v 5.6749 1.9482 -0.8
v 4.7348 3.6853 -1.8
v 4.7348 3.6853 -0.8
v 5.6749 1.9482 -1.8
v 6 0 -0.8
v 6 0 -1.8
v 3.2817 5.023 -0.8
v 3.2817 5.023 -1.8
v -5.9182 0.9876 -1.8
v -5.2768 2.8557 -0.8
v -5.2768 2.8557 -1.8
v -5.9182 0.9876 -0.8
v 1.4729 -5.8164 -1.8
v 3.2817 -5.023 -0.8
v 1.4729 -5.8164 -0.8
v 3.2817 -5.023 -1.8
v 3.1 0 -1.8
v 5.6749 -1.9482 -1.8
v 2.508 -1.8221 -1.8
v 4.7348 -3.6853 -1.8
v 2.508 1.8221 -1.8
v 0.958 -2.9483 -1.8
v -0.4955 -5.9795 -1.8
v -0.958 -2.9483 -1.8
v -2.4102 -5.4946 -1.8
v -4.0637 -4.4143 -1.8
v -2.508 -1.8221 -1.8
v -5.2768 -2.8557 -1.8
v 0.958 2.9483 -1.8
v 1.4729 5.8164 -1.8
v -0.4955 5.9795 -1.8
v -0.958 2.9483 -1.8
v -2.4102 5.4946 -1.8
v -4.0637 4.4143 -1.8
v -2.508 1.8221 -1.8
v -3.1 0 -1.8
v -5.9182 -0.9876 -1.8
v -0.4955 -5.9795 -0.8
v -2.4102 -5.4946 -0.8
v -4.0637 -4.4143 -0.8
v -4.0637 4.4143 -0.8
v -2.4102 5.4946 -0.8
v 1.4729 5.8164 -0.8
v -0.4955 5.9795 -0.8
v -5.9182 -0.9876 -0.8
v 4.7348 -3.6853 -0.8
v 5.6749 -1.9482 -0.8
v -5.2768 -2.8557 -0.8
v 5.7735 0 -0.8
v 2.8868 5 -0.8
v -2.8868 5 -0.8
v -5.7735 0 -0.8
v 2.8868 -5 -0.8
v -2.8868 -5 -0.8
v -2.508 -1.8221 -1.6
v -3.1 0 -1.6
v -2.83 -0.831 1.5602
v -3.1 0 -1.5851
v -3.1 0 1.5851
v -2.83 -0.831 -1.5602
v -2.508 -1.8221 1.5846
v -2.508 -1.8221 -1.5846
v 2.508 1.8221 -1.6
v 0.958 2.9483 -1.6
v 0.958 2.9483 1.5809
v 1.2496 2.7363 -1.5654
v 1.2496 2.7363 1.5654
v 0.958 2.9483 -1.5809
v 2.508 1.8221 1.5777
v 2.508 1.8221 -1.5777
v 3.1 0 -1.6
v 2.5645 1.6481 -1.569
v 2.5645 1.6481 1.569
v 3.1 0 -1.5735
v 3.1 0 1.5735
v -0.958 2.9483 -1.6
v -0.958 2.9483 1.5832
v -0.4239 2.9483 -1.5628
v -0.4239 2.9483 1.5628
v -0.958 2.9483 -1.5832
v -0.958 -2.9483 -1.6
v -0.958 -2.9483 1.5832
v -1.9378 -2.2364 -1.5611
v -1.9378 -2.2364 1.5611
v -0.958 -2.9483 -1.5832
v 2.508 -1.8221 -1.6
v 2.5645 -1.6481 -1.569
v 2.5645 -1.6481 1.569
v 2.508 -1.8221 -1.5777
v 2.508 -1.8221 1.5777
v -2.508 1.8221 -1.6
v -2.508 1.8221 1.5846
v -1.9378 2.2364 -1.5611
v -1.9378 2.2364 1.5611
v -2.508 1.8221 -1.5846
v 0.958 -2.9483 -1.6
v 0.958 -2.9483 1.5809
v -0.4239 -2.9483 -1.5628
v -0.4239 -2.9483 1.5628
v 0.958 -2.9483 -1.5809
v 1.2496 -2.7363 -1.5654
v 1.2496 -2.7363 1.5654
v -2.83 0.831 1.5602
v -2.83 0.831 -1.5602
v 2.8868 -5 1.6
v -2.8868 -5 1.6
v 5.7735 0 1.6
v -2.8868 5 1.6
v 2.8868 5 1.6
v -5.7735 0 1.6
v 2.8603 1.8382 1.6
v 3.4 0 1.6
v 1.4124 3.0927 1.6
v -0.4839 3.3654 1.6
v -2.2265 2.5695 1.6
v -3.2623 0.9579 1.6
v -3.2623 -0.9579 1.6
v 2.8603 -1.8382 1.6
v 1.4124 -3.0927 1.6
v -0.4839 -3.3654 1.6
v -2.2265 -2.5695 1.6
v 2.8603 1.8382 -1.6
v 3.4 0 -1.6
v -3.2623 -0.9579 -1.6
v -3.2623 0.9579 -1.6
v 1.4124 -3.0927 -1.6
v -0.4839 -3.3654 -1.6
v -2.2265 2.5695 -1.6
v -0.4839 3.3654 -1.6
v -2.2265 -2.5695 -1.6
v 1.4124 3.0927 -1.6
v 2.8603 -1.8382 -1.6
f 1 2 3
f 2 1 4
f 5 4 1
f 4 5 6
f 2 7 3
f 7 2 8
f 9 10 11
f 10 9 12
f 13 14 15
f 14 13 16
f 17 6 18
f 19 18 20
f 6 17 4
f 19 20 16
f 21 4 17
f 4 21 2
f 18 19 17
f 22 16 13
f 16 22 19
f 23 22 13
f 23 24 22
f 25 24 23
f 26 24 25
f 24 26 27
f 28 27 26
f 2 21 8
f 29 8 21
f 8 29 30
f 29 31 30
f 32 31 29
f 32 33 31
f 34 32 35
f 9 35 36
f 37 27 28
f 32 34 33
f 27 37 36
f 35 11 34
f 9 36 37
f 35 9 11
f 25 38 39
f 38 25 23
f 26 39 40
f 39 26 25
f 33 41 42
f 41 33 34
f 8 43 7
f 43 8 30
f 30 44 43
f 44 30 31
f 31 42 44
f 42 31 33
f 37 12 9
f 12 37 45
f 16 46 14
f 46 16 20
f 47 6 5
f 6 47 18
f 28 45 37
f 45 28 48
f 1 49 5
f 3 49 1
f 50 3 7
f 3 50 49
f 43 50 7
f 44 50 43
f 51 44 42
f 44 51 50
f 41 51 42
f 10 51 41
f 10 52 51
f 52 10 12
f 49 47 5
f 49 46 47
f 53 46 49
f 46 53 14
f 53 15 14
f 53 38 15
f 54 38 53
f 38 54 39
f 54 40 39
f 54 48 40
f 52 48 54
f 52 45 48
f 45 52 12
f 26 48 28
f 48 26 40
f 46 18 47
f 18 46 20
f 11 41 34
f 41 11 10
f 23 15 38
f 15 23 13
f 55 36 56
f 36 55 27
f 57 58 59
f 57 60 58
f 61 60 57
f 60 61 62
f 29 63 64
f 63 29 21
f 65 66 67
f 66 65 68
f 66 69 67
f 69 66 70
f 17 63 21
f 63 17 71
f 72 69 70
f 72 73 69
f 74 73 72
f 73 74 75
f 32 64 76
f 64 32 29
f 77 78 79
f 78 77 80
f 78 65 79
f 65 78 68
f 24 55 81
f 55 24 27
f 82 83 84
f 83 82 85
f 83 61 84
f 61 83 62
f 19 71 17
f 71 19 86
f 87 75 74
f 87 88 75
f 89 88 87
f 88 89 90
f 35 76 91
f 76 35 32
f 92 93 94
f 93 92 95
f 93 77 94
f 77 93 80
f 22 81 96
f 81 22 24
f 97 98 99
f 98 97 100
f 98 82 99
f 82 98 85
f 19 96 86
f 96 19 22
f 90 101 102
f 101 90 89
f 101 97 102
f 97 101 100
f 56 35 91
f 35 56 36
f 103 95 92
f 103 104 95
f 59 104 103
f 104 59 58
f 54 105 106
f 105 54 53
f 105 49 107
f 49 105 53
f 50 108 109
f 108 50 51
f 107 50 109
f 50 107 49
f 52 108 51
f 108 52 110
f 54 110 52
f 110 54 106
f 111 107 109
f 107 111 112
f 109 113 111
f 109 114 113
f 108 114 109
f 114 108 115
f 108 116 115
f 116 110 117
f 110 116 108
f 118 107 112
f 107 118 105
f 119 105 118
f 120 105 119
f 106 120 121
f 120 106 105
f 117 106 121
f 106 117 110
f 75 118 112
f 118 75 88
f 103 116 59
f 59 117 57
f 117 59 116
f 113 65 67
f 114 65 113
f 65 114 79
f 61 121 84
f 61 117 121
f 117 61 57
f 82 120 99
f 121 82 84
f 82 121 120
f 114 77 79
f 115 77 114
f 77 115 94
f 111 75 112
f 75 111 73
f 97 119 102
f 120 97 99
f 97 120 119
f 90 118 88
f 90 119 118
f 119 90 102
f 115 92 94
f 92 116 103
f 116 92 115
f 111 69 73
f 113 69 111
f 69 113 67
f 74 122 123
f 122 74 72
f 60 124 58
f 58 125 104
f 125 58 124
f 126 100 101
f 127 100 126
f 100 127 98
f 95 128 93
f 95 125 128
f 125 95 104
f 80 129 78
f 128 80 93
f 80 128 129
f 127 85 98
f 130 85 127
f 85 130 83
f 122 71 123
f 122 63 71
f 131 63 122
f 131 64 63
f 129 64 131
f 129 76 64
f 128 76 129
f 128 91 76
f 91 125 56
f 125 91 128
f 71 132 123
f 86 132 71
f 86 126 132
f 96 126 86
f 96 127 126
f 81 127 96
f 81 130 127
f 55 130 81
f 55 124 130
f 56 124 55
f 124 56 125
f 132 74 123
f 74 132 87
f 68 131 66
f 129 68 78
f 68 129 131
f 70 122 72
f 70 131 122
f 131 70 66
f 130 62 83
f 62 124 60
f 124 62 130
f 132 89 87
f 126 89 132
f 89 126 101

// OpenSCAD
// Parameters
thread_nominal_diameter_mm = 6; //[3:12:0.1]
thread_pitch_mm = 1; //[0.5:2:0.1]
across_flats_mm = 10; //[6:20:0.1]
thickness_mm = 3.2; //[1.6:6.4:0.1]
tolerance_mm = 0.2; //[0.05:0.5:0.05]
chamfer_mm = 0.3; //[0.1:1:0.05]
overlap_mm = 0.8; //[0.5:2:0.1]
washer_outer_diameter_mm = 12; //[8:24:0.1]
washer_thickness_mm = 1; //[0.5:2.5:0.1]

// Hex Nut Body
module hex_nut_body() {
  color("DimGray") {
    cylinder(h=thickness_mm, r=(across_flats_mm/2)/cos(30), center=true, $fn=6);
  }
}

// Central Thread Hole
module central_thread_hole() {
  cylinder(h=thickness_mm + 2*overlap_mm, r=(thread_nominal_diameter_mm + tolerance_mm)/2, center=true);
}

// Edge Chamfer
module edge_chamfer_top() {
  translate([0, 0, (thickness_mm/2) - (chamfer_mm/2)])
    rotate([180, 0, 0])
    cylinder(h=chamfer_mm, r1=(thread_nominal_diameter_mm + tolerance_mm)/2 + chamfer_mm, r2=0, center=true);
}

module edge_chamfer_bottom() {
  translate([0, 0, (-thickness_mm/2) + (chamfer_mm/2)])
    cylinder(h=chamfer_mm, r1=(thread_nominal_diameter_mm + tolerance_mm)/2 + chamfer_mm, r2=0, center=true);
}

// Washer Outer
module washer_outer() {
  color("Silver") {
    translate([0, 0, (-thickness_mm/2) - (washer_thickness_mm/2) + overlap_mm])
      cylinder(h=washer_thickness_mm, r=washer_outer_diameter_mm/2, center=true);
  }
}

// Washer Inner Hole
module washer_inner_hole() {
  translate([0, 0, (-thickness_mm/2) - (washer_thickness_mm/2) + overlap_mm])
    cylinder(h=washer_thickness_mm + 2*overlap_mm, r=(thread_nominal_diameter_mm + tolerance_mm)/2, center=true);
}

// Washer Ring
module washer_ring() {
  difference() {
    washer_outer();
    washer_inner_hole();
  }
}

// Nut and Washer
module nut_and_washer() {
  union() {
    hex_nut_body();
    washer_ring();
  }
}

// Nut Hole and Lead-in
module nut_hole_and_lead_in() {
  union() {
    central_thread_hole();
    edge_chamfer_top();
    edge_chamfer_bottom();
  }
}

// Final Nut
module final_nut() {
  difference() {
    nut_and_washer();
    nut_hole_and_lead_in();
  }
}

// Assembly
module assembly() {
  final_nut();
}

assembly();
